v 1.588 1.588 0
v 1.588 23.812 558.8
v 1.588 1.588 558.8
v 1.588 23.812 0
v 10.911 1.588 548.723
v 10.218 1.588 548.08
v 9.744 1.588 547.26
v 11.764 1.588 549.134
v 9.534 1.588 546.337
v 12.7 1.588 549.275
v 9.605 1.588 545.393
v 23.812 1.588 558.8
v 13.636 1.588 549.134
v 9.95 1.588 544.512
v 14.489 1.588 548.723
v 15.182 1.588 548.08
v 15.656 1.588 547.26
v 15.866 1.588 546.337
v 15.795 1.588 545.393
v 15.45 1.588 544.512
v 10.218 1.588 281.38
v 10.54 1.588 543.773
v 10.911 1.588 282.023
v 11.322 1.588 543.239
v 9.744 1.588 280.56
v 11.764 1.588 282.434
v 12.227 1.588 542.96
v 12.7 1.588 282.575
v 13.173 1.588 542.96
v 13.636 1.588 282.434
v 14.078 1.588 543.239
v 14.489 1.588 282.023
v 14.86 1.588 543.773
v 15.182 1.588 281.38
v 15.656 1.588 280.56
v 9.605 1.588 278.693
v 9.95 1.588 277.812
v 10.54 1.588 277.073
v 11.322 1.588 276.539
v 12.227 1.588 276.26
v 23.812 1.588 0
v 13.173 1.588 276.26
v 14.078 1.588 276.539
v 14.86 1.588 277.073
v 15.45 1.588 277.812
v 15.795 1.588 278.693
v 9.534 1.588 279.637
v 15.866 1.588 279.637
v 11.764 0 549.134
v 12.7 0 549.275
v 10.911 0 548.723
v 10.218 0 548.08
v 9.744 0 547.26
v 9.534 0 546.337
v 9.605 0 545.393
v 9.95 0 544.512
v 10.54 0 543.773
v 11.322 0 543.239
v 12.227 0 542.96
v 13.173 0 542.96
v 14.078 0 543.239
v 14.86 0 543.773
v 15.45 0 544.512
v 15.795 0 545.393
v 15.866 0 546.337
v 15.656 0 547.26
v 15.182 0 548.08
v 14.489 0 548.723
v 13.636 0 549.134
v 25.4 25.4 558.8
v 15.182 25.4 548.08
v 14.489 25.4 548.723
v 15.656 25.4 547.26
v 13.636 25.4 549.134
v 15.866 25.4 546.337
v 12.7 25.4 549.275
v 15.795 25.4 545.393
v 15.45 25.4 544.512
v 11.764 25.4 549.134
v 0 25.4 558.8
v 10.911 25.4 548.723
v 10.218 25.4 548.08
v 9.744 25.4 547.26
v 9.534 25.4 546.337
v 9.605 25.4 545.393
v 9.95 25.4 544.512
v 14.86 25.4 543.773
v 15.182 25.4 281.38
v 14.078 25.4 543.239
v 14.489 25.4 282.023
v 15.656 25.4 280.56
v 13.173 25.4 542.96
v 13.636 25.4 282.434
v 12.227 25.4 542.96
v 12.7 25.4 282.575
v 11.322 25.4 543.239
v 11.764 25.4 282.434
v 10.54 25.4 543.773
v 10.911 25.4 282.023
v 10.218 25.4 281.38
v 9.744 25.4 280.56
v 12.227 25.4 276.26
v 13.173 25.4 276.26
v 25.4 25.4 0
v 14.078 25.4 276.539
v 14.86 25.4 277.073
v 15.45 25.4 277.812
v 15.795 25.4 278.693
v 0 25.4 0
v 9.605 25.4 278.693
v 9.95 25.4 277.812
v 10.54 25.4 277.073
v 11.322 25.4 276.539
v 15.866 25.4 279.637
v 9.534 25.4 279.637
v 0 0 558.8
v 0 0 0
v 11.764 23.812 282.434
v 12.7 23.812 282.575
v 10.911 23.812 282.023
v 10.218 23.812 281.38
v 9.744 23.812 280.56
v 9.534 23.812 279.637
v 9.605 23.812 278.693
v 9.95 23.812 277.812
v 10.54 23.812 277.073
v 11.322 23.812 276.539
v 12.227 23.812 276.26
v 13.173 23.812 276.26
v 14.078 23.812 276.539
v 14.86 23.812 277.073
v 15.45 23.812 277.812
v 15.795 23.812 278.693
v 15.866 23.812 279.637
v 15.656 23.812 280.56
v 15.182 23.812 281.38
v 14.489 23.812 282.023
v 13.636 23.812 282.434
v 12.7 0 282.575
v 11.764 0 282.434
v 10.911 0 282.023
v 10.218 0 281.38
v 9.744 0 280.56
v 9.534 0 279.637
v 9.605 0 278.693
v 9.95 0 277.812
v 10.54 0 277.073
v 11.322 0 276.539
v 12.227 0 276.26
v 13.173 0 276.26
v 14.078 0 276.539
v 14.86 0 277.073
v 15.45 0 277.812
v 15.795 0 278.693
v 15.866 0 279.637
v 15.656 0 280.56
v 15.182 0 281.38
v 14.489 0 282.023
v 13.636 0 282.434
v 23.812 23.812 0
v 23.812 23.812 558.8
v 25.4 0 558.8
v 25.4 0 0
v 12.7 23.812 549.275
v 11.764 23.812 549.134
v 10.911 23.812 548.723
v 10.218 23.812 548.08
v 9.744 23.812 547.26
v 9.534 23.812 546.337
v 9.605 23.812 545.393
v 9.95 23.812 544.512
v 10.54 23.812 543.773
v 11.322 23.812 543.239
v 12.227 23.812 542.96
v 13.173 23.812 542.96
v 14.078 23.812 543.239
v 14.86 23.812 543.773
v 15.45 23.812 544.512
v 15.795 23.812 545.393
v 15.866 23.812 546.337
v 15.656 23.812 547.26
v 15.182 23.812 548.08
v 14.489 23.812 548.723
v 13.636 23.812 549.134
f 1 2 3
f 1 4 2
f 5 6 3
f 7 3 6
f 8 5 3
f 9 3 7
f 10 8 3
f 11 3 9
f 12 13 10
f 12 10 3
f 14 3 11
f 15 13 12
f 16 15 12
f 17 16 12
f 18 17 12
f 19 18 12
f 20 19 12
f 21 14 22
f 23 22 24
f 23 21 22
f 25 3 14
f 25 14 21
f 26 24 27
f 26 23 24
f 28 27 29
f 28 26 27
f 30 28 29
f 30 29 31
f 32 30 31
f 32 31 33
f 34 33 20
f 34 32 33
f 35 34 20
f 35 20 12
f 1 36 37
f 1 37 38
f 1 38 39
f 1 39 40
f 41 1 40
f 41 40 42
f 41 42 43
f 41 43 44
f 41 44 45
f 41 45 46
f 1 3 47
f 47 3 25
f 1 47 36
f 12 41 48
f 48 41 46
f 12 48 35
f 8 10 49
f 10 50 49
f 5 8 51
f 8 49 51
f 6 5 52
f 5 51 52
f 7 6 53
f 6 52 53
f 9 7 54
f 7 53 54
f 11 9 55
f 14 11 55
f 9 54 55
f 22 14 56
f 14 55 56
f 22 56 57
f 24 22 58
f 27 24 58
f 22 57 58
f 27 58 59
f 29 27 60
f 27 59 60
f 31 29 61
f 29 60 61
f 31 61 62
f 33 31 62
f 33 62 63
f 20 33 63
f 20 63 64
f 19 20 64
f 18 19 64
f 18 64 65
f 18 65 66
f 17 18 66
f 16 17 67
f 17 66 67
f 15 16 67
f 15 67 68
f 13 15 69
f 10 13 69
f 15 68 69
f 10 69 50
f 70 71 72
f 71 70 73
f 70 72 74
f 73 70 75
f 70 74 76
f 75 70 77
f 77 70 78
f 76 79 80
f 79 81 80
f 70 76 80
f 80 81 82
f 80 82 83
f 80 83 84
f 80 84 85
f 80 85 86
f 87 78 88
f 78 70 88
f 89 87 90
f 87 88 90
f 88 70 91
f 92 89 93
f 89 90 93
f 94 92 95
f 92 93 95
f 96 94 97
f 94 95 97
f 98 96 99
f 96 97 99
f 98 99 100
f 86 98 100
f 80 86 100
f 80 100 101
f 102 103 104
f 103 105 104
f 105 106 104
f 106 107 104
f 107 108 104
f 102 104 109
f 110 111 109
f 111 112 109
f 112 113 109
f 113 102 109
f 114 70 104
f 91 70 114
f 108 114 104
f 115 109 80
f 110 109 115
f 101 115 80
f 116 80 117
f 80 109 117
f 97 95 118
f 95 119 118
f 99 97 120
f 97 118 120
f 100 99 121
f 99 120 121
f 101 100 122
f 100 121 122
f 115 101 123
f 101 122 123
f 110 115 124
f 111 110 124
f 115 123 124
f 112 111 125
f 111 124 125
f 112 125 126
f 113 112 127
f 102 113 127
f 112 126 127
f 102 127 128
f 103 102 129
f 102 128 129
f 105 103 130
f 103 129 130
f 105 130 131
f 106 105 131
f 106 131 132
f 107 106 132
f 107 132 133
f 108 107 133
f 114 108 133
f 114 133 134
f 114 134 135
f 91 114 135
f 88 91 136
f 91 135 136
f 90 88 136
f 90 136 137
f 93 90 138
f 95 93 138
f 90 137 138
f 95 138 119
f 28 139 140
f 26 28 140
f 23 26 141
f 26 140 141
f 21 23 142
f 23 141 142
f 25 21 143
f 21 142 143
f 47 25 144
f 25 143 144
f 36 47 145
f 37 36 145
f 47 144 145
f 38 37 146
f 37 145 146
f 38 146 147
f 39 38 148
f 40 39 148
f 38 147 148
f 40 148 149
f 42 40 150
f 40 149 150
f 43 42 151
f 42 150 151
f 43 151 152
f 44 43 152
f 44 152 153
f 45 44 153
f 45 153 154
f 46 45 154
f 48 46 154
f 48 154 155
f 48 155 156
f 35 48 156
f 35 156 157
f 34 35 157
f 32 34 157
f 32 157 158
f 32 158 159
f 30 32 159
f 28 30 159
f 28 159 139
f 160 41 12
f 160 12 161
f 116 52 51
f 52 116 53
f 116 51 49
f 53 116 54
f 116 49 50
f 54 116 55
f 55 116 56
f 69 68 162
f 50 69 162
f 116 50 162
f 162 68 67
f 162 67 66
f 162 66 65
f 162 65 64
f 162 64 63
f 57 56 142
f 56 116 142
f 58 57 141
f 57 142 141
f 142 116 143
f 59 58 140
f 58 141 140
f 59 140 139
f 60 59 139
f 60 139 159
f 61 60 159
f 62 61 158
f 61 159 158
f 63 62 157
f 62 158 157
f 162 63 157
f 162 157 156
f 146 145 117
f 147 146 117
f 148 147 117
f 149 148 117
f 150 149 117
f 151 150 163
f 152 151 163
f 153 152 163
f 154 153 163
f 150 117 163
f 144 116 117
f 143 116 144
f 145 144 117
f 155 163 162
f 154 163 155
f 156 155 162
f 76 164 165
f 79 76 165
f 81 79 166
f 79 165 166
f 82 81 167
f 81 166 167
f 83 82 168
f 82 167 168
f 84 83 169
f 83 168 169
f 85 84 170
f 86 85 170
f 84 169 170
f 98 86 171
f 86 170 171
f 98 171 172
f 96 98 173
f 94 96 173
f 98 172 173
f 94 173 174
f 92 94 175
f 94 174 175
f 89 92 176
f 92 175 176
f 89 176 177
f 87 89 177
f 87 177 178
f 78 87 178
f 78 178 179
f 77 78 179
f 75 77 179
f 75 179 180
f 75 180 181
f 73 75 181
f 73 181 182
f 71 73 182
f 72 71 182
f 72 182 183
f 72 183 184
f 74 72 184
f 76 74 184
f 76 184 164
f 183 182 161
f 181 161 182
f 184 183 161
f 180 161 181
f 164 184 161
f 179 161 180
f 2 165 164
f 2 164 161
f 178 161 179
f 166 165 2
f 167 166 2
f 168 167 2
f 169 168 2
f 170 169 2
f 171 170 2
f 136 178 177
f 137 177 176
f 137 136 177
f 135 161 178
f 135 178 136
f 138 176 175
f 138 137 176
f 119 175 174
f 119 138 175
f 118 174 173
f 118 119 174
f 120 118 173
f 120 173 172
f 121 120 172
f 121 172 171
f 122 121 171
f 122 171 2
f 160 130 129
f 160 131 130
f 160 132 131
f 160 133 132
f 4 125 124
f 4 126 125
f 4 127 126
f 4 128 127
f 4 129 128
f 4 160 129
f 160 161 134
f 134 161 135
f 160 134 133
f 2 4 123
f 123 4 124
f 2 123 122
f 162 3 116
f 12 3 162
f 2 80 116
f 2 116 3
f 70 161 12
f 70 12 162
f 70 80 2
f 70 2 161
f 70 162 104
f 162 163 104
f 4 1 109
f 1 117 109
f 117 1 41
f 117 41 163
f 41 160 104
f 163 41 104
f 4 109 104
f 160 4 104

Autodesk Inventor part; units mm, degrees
ref_plane "YZ Plane" through (0, 0, 0) normal (1, 0, 0) x (0, 1, 0)
ref_plane "XZ Plane" through (0, 0, 0) normal (0, 1, 0) x (-1, 0, 0)
ref_plane "XY Plane" through (0, 0, 0) normal (0, 0, 1) x (1, 0, 0)
sketch "Sketch1" plane through (0, 0, 0) normal (0, 0, 1) x (1, 0, 0)
  line L0 (0, 0) -> (25.4, 0)
  line L1 (25.4, 0) -> (25.4, 25.4)
  line L2 (25.4, 25.4) -> (0, 25.4)
  line L3 (0, 25.4) -> (0, 0)
  line L4 (1.5875, 1.5875) -> (23.8125, 1.5875)
  line L5 (23.8125, 1.5875) -> (23.8125, 23.8125)
  line L6 (23.8125, 23.8125) -> (1.5875, 23.8125)
  line L7 (1.5875, 23.8125) -> (1.5875, 1.5875)
  dimension "d0" = 25.4
  dimension "d1" = 25.4
  dimension "d2" = 1.5875
extrude "Extrusion1" add sketch "Sketch1" along normal blind 558.8
sketch "Sketch3" plane through (0, 25.4, 0) normal (0, 1, 0) x (1, 0, 0)
  line L0 (25.4, 0) -> (0, 0) projected
  line L1 (0, 0) -> (0, -558.8) projected
  line L2 (25.4, -558.8) -> (0, -558.8) projected
  line L3 (25.4, 0) -> (25.4, -558.8) projected
  point P0 (0, 0)
  point P1 (12.7, -279.4)
  dimension "d15" = 279.4
  dimension "d16" = 558.8
  dimension "d17" = 12.7
hole "Hole2" at (12.7, 25.4, 279.4) direction (0, -1, 0) diameter 6.35 end through all clearance for "Flat Head Machine Screw (82)" size "1/4" standard "Ansi Unified Screw Threads"
sketch "Sketch4" plane through (0, 25.4, 0) normal (0, 1, 0) x (1, 0, 0)
  circle A0 centre (12.7, -279.4) radius 3.175 projected
  line L0 (25.4, 0) -> (0, 0) projected
  line L1 (0, 0) -> (0, -558.8) projected
  line L2 (25.4, -558.8) -> (0, -558.8) projected
  line L3 (25.4, 0) -> (25.4, -558.8) projected
  point P0 (0, 0)
  point P1 (12.7, -546.1)
  dimension "d25" = 12.7
  dimension "d26" = 12.7
  dimension "d27" = 12.7
hole "Hole3" at (12.7, 25.4, 546.1) direction (0, -1, 0) diameter 6.35 end through all
equation "\"d15\" = 0.5 * d16"
equation "\"d25\" = d26"
properties part number "ScissorLiftBarBottom" material "Aluminum 6061"
